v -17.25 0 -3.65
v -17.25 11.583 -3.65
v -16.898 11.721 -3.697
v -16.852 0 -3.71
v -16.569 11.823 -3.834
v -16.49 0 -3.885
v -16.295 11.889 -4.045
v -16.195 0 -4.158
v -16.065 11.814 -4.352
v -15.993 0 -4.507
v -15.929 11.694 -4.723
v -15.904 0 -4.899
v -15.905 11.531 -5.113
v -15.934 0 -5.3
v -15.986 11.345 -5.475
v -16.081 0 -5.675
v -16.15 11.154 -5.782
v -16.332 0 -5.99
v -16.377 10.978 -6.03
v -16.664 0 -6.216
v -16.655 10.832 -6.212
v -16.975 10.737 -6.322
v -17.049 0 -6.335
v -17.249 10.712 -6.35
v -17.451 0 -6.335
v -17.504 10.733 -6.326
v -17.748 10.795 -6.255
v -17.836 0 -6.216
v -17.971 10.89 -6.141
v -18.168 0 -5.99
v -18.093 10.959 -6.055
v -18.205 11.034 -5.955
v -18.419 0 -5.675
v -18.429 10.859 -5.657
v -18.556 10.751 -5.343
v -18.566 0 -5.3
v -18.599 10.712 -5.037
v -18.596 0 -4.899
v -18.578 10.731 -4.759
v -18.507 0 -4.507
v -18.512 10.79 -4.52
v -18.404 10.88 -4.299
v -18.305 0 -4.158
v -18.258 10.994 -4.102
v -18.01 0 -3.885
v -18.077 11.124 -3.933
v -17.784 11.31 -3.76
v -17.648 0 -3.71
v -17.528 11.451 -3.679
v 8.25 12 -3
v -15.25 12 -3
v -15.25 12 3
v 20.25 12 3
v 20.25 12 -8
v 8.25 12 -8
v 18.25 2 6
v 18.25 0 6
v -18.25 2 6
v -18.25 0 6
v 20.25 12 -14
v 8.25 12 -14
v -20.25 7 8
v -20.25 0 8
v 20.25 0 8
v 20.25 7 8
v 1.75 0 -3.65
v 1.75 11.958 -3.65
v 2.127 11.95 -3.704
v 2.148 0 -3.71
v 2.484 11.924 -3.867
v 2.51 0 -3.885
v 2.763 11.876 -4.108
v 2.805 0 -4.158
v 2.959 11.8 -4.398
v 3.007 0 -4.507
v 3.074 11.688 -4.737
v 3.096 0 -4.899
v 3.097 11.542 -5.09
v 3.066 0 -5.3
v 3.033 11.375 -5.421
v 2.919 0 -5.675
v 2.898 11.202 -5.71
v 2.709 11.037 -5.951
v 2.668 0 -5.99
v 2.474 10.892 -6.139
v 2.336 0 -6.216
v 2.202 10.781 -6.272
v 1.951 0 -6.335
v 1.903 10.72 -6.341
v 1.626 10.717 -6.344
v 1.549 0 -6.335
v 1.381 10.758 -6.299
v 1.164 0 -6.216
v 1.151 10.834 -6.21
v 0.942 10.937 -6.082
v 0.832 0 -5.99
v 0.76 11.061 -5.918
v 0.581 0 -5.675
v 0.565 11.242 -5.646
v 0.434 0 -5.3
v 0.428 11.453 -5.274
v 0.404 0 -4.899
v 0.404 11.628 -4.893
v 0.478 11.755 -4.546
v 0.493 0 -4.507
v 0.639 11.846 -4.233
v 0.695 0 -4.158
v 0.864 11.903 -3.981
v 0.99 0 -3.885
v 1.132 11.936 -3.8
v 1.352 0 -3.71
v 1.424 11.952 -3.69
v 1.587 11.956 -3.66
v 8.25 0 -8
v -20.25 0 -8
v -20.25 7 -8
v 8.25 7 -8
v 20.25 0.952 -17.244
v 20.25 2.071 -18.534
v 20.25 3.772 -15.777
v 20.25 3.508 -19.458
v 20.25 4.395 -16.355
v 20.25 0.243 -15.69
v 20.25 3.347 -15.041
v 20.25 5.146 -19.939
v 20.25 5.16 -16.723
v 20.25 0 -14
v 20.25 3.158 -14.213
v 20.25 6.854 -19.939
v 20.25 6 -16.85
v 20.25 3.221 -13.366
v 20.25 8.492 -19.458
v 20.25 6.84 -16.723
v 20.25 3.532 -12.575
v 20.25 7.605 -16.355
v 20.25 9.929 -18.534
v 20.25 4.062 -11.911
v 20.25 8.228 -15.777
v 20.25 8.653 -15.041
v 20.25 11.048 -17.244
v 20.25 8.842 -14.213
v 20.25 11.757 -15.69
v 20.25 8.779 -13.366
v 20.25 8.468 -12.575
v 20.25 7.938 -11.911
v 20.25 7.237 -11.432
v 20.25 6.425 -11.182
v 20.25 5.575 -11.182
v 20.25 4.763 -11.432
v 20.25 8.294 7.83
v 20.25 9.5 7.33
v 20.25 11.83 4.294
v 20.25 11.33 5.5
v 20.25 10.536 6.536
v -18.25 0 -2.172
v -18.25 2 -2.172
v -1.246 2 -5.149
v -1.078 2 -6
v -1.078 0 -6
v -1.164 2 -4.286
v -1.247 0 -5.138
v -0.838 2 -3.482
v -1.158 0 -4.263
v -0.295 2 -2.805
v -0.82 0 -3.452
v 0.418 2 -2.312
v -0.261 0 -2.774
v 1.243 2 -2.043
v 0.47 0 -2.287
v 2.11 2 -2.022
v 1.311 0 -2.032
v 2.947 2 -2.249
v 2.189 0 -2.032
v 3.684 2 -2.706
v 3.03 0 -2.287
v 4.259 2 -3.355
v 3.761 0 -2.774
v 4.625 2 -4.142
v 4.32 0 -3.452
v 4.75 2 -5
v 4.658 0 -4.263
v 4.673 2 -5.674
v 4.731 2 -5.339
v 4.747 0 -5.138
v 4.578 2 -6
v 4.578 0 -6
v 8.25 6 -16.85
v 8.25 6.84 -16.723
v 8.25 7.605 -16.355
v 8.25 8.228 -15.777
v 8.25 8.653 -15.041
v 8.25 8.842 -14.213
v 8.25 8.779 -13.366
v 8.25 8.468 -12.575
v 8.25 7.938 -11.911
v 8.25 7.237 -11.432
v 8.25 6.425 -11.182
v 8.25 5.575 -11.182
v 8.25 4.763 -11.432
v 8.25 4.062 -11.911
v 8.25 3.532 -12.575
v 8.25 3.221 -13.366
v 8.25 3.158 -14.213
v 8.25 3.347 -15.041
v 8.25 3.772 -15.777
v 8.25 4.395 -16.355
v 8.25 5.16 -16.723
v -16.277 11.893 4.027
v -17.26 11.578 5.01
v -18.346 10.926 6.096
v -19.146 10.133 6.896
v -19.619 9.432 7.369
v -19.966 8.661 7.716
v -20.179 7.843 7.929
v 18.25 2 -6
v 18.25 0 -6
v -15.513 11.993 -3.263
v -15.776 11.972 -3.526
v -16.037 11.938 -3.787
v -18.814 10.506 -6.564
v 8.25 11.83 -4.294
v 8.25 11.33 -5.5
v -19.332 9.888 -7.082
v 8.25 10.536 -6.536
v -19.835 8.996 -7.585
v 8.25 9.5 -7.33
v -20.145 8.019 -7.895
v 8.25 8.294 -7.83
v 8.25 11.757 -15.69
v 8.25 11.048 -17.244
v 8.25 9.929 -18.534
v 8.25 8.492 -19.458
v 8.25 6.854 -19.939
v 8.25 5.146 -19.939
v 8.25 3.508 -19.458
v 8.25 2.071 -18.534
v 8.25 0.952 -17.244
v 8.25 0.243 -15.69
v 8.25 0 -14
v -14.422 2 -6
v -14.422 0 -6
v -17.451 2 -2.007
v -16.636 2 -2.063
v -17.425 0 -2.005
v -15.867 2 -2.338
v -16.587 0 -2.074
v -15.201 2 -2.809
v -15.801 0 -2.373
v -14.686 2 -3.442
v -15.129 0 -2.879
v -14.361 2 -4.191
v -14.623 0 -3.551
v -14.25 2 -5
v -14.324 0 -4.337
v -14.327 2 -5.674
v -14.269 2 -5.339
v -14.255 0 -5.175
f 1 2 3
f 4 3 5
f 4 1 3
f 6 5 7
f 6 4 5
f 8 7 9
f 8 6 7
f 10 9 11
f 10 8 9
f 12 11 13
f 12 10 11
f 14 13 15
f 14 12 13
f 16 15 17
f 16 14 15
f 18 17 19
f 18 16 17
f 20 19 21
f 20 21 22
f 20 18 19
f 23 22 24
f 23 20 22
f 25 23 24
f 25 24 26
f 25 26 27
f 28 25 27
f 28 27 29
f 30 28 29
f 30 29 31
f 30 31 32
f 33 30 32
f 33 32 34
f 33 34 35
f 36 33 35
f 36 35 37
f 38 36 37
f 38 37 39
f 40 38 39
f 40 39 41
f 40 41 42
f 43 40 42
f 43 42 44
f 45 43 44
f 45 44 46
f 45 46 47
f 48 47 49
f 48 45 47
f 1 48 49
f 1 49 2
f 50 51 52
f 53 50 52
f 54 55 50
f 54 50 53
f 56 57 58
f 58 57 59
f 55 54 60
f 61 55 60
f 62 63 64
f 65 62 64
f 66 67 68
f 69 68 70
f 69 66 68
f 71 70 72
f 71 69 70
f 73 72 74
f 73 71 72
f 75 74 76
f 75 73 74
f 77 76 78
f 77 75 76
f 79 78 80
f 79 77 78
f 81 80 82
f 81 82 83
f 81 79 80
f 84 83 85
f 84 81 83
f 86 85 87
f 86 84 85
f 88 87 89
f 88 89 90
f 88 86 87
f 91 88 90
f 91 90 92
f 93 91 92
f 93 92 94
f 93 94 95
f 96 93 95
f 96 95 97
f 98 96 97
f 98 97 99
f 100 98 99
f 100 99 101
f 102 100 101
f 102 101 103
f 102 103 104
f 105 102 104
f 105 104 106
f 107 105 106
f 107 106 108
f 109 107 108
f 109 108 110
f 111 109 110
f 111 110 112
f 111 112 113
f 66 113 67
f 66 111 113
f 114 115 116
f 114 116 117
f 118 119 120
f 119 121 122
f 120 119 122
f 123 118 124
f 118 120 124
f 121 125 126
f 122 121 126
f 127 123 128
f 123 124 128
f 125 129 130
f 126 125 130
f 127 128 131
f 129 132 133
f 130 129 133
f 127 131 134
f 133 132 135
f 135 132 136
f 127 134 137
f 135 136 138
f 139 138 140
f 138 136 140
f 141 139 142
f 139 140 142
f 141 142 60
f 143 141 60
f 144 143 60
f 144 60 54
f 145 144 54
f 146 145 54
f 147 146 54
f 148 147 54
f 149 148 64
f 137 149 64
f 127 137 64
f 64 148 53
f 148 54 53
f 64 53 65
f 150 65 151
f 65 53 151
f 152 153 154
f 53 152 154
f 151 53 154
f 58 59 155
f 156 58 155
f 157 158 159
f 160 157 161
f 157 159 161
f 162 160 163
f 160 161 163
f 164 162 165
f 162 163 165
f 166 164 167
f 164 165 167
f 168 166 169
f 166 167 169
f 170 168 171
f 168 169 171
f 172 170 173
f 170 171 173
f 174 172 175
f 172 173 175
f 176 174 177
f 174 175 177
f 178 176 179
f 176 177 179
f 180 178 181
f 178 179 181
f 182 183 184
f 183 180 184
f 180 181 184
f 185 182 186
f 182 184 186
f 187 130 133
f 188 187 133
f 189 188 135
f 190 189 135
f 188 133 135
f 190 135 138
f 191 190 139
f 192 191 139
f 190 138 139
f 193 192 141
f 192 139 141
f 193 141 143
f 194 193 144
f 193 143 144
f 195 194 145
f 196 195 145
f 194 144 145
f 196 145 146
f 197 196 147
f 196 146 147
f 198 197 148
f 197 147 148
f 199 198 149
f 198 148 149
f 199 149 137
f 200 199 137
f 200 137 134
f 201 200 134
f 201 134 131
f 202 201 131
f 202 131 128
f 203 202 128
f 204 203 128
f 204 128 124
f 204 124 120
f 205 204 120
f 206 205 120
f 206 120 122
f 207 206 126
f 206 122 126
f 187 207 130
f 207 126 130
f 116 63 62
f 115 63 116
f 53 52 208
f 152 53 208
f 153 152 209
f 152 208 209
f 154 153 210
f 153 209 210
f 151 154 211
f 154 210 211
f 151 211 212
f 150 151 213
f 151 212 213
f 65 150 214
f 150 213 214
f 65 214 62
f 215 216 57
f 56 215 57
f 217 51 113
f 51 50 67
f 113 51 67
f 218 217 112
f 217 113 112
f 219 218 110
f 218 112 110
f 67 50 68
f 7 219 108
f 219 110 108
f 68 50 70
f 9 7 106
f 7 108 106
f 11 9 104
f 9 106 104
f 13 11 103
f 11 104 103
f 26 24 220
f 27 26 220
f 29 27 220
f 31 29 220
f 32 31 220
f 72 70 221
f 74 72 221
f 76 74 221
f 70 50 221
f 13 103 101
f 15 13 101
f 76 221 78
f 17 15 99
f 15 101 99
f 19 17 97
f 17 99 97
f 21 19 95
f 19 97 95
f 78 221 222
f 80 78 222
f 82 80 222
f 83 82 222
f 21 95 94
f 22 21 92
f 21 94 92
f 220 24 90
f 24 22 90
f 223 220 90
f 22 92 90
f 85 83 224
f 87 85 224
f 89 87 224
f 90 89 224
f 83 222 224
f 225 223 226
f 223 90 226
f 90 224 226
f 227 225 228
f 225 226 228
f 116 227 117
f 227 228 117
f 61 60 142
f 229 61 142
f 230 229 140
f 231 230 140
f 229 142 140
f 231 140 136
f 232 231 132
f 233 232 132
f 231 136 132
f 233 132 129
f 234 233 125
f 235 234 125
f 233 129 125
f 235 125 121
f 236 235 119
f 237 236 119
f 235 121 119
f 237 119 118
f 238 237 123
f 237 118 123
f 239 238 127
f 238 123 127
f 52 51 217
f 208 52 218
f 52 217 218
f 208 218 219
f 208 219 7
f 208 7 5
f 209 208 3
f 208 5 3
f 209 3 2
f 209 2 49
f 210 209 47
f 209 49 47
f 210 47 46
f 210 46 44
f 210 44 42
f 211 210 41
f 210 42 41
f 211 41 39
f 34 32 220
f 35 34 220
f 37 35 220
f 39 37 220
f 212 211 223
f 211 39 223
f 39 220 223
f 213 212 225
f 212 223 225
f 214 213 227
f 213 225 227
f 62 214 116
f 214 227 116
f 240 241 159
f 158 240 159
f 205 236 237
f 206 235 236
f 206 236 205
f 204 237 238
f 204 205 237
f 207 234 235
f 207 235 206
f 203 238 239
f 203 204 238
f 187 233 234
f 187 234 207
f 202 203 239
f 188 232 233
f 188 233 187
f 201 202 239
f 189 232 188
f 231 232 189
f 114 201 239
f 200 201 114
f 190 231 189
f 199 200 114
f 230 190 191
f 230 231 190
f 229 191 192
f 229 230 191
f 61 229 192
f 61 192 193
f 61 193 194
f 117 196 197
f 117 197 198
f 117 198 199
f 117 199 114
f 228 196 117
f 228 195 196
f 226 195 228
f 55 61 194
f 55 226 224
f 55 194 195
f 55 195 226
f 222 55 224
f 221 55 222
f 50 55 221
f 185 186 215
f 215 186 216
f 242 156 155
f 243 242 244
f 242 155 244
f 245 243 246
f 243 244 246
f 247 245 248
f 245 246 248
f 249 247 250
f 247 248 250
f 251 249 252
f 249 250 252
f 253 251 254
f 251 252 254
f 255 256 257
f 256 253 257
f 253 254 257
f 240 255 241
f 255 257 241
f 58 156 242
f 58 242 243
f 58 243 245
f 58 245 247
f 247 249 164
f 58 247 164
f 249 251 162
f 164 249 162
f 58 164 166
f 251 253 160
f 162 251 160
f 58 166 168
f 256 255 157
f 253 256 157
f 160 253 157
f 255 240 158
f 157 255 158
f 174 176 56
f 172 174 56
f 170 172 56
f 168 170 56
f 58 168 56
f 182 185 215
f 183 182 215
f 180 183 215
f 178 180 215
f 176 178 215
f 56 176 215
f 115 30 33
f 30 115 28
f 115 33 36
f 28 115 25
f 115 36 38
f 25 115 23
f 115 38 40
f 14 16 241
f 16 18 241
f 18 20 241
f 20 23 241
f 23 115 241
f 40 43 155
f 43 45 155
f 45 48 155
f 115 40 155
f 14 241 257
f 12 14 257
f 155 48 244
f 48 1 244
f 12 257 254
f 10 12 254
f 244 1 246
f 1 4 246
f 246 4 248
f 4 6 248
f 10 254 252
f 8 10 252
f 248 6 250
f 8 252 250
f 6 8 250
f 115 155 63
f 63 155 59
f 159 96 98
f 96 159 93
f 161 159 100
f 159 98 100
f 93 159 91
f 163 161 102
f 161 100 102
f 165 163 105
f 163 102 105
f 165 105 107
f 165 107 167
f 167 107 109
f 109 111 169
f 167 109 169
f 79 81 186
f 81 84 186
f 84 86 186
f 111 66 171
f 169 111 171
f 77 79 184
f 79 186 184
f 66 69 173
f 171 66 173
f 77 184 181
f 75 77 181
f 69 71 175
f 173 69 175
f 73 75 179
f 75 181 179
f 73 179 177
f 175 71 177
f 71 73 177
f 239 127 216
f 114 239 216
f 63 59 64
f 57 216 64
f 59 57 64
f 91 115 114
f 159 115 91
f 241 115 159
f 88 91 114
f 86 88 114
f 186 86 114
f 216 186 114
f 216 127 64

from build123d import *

# Parameters (mm, degrees)
SKETCH1_W           = 40.5
SKETCH1_H           = 16
SKETCH1_R           = 1.35
BOSS_EXTRUDE1_DEPTH = 12
BOSS_EXTRUDE2_START = 2
BOSS_EXTRUDE2_DEPTH = 10
SKETCH3_R           = 2.85
BOSS_EXTRUDE3_DEPTH = 12
FILLET2_R           = 5


with BuildPart() as part:
    # Sketch1 → Boss-Extrude1 (new body)
    with BuildSketch(Plane(origin=(0, 0, 0), x_dir=(1, 0, 0), z_dir=(0, 1, 0))):
        Rectangle(SKETCH1_W, SKETCH1_H)
        with Locations(Location((-17.25, 5, 0), (0, 0, 270))):
            Circle(SKETCH1_R, mode=Mode.SUBTRACT)
        with BuildLine():
            Line((-14.421572875, 6), (-1.078427125, 6))
            ThreePointArc((-1.078427125, 6), (1.75, 2), (4.578427125, 6))
            Line((4.578427125, 6), (18.25, 6))
            Line((18.25, 6), (18.25, -6))
            Line((18.25, -6), (-18.25, -6))
            Line((-18.25, -6), (-18.25, 2.171572875))
            ThreePointArc((-18.25, 2.171572875), (-15.128679656, 2.878679656), (-14.421572875, 6))
        make_face(mode=Mode.SUBTRACT)
        with Locations(Location((1.75, 5, 0), (0, 0, 270))):
            Circle(SKETCH1_R, mode=Mode.SUBTRACT)
    extrude(amount=BOSS_EXTRUDE1_DEPTH)

    # Sketch1<3> → Boss-Extrude2 (add)
    with BuildSketch(Plane(origin=(0, 0, 0), x_dir=(1, 0, 0), z_dir=(0, 1, 0)).offset(BOSS_EXTRUDE2_START)):
        with BuildLine():
            ThreePointArc((-14.25, 5), (-15.517949192, 2.550510257), (-18.25, 2.171572875))
            Line((-18.25, 2.171572875), (-18.25, -6))
            Line((-18.25, -6), (18.25, -6))
            Line((18.25, -6), (18.25, 6))
            Line((18.25, 6), (4.578427125, 6))
            ThreePointArc((4.578427125, 6), (4.706795679, 5.507305936), (4.75, 5))
            ThreePointArc((4.75, 5), (1.242694064, 2.043204321), (-1.078427125, 6))
            Line((-1.078427125, 6), (-14.421572875, 6))
            ThreePointArc((-14.421572875, 6), (-14.293204321, 5.507305936), (-14.25, 5))
        make_face()
    extrude(amount=BOSS_EXTRUDE2_DEPTH)

    # Sketch3 → Boss-Extrude3 (add)
    with BuildSketch(Plane(origin=(20.25, 0, 0), x_dir=(0, 0, -1), z_dir=(1, 0, 0))):
        with BuildLine():
            ThreePointArc((13.999999499, 12.000000501), (20.00000025, 6.000000501), (14, 0))
            Line((14, 0), (8, 0))
            Line((8, 0), (8, 12))
            Line((8, 12), (13.999999499, 12.000000501))
        make_face()
        with Locations((14, 6.000000501)):
            Circle(SKETCH3_R, mode=Mode.SUBTRACT)
    extrude(amount=-BOSS_EXTRUDE3_DEPTH)

    # Fillet2
    # the kernel refuses this fillet: 5 mm, written as the material it takes off along each edge
    with BuildSketch(Plane(origin=(-20.25, 12, -20.5), x_dir=(1, 0, 0), z_dir=(0, 0, 1))) as fillet2_piece_1:
        with BuildLine():
            CenterArc((FILLET2_R, -FILLET2_R), FILLET2_R, 90, 90)
            Line((0, -FILLET2_R), (0, 0))
            Line((0, 0), (FILLET2_R, 0))
        make_face()
    extrude(amount=41, mode=Mode.SUBTRACT)
    with BuildSketch(Plane(origin=(8.25, 12, -8), x_dir=(0, -1, 0), z_dir=(-1, 0, 0))) as fillet2_piece_2:
        with BuildLine():
            CenterArc((FILLET2_R, FILLET2_R), FILLET2_R, 180, 90)
            Line((0, FILLET2_R), (0, 0))
            Line((0, 0), (FILLET2_R, 0))
        make_face()
    extrude(amount=41, mode=Mode.SUBTRACT)
    with BuildSketch(Plane(origin=(-32.75, 12, 8), x_dir=(0, -1, 0), z_dir=(1, 0, 0))) as fillet2_piece_3:
        with BuildLine():
            CenterArc((FILLET2_R, FILLET2_R), FILLET2_R, 180, 90)
            Line((0, FILLET2_R), (0, 0))
            Line((0, 0), (FILLET2_R, 0))
        make_face()
    extrude(amount=65.5, mode=Mode.SUBTRACT)


solid = part.part
